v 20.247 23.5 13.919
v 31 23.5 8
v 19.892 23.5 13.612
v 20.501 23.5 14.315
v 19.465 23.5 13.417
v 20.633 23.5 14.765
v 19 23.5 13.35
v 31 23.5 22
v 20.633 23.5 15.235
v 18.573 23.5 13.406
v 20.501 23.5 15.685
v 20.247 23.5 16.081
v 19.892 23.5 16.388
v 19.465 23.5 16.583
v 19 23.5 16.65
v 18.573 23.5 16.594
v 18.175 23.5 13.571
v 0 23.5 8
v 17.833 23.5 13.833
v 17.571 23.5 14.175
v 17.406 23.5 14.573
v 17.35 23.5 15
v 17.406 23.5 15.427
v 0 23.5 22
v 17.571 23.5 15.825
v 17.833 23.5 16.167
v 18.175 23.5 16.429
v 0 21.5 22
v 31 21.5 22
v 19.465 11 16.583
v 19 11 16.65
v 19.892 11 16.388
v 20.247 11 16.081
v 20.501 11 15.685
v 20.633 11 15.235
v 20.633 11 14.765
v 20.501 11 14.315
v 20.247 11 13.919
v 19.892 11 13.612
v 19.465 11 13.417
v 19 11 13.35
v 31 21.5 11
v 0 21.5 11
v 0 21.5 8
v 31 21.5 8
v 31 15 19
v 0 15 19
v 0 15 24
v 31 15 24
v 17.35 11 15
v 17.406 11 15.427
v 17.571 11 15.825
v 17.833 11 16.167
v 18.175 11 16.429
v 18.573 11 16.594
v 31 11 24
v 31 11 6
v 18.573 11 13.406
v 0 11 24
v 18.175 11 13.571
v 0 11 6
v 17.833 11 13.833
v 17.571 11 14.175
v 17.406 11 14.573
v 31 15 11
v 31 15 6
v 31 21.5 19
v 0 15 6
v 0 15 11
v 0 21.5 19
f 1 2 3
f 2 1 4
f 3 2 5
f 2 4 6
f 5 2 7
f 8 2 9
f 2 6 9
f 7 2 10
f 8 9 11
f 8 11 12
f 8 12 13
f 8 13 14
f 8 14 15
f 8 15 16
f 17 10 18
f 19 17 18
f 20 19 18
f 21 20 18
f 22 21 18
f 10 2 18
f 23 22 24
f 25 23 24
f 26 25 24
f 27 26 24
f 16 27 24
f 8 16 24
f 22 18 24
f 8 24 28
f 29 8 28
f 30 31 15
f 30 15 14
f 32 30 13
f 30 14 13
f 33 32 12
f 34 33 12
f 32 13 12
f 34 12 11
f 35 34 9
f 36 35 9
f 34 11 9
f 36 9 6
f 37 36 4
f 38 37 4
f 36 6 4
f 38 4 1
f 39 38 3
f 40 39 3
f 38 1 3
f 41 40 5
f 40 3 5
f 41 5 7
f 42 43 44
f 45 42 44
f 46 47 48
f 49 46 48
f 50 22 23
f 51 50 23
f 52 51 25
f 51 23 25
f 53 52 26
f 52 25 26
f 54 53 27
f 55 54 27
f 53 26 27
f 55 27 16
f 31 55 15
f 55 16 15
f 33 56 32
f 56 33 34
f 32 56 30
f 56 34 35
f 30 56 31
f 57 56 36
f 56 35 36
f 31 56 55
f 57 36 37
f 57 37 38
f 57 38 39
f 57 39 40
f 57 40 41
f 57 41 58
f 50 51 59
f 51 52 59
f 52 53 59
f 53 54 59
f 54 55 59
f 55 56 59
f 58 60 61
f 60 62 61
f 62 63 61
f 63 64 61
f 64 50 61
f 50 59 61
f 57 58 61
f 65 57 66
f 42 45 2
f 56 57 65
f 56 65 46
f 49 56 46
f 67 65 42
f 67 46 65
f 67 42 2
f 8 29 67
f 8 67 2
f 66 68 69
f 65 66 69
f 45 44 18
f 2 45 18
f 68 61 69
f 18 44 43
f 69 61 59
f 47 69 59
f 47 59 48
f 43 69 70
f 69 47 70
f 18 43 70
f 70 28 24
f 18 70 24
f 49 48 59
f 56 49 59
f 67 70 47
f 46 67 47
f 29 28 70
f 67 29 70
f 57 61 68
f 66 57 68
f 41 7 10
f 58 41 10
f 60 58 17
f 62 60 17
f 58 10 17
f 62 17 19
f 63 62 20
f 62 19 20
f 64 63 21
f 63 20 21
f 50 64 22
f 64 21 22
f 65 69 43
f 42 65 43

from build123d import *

# Parameters (mm, degrees)
F1_DEPTH = 38
F3_DEPTH = 25
F4_DEPTH = 7


with BuildPart() as f1:
    # F0 (on Right) → F1 (new body)
    with BuildSketch(Plane.YZ):
        Polygon((15, 19), (15, 20), (15, 24), (11, 24), (11, 15), (11, 6), (15, 6), (15, 10), (15, 11), (21.5, 11), (21.5, 8), (23.5, 8), (23.5, 15), (23.5, 22), (21.5, 22), (21.5, 19), align=None)
    extrude(amount=F1_DEPTH)

    # F2 (on face) → F3 (cut)
    with BuildSketch(Plane(origin=(0, 23.5, 0), x_dir=(-1, 0, 0), z_dir=(0, 1, 0))):
        with BuildLine():
            ThreePointArc((-17.35, 15), (-17.833273811, 16.166726189), (-19, 16.65))
            Line((-19, 16.65), (-19, 13.35))
            ThreePointArc((-19, 13.35), (-17.833273811, 13.833273811), (-17.35, 15))
        make_face()
        with BuildLine():
            Line((-19, 13.35), (-19, 16.65))
            ThreePointArc((-19, 16.65), (-20.65, 15), (-19, 13.35))
        make_face()
    extrude(amount=-F3_DEPTH, mode=Mode.SUBTRACT)

    # F4 (cut): a face of the model
    f4_faces = [f1.faces().sort_by_distance(p)[0] for p in [
        (38, 16.5460526316, 15),
    ]]
    extrude(f4_faces, amount=-F4_DEPTH, mode=Mode.SUBTRACT)


solid = f1.part
